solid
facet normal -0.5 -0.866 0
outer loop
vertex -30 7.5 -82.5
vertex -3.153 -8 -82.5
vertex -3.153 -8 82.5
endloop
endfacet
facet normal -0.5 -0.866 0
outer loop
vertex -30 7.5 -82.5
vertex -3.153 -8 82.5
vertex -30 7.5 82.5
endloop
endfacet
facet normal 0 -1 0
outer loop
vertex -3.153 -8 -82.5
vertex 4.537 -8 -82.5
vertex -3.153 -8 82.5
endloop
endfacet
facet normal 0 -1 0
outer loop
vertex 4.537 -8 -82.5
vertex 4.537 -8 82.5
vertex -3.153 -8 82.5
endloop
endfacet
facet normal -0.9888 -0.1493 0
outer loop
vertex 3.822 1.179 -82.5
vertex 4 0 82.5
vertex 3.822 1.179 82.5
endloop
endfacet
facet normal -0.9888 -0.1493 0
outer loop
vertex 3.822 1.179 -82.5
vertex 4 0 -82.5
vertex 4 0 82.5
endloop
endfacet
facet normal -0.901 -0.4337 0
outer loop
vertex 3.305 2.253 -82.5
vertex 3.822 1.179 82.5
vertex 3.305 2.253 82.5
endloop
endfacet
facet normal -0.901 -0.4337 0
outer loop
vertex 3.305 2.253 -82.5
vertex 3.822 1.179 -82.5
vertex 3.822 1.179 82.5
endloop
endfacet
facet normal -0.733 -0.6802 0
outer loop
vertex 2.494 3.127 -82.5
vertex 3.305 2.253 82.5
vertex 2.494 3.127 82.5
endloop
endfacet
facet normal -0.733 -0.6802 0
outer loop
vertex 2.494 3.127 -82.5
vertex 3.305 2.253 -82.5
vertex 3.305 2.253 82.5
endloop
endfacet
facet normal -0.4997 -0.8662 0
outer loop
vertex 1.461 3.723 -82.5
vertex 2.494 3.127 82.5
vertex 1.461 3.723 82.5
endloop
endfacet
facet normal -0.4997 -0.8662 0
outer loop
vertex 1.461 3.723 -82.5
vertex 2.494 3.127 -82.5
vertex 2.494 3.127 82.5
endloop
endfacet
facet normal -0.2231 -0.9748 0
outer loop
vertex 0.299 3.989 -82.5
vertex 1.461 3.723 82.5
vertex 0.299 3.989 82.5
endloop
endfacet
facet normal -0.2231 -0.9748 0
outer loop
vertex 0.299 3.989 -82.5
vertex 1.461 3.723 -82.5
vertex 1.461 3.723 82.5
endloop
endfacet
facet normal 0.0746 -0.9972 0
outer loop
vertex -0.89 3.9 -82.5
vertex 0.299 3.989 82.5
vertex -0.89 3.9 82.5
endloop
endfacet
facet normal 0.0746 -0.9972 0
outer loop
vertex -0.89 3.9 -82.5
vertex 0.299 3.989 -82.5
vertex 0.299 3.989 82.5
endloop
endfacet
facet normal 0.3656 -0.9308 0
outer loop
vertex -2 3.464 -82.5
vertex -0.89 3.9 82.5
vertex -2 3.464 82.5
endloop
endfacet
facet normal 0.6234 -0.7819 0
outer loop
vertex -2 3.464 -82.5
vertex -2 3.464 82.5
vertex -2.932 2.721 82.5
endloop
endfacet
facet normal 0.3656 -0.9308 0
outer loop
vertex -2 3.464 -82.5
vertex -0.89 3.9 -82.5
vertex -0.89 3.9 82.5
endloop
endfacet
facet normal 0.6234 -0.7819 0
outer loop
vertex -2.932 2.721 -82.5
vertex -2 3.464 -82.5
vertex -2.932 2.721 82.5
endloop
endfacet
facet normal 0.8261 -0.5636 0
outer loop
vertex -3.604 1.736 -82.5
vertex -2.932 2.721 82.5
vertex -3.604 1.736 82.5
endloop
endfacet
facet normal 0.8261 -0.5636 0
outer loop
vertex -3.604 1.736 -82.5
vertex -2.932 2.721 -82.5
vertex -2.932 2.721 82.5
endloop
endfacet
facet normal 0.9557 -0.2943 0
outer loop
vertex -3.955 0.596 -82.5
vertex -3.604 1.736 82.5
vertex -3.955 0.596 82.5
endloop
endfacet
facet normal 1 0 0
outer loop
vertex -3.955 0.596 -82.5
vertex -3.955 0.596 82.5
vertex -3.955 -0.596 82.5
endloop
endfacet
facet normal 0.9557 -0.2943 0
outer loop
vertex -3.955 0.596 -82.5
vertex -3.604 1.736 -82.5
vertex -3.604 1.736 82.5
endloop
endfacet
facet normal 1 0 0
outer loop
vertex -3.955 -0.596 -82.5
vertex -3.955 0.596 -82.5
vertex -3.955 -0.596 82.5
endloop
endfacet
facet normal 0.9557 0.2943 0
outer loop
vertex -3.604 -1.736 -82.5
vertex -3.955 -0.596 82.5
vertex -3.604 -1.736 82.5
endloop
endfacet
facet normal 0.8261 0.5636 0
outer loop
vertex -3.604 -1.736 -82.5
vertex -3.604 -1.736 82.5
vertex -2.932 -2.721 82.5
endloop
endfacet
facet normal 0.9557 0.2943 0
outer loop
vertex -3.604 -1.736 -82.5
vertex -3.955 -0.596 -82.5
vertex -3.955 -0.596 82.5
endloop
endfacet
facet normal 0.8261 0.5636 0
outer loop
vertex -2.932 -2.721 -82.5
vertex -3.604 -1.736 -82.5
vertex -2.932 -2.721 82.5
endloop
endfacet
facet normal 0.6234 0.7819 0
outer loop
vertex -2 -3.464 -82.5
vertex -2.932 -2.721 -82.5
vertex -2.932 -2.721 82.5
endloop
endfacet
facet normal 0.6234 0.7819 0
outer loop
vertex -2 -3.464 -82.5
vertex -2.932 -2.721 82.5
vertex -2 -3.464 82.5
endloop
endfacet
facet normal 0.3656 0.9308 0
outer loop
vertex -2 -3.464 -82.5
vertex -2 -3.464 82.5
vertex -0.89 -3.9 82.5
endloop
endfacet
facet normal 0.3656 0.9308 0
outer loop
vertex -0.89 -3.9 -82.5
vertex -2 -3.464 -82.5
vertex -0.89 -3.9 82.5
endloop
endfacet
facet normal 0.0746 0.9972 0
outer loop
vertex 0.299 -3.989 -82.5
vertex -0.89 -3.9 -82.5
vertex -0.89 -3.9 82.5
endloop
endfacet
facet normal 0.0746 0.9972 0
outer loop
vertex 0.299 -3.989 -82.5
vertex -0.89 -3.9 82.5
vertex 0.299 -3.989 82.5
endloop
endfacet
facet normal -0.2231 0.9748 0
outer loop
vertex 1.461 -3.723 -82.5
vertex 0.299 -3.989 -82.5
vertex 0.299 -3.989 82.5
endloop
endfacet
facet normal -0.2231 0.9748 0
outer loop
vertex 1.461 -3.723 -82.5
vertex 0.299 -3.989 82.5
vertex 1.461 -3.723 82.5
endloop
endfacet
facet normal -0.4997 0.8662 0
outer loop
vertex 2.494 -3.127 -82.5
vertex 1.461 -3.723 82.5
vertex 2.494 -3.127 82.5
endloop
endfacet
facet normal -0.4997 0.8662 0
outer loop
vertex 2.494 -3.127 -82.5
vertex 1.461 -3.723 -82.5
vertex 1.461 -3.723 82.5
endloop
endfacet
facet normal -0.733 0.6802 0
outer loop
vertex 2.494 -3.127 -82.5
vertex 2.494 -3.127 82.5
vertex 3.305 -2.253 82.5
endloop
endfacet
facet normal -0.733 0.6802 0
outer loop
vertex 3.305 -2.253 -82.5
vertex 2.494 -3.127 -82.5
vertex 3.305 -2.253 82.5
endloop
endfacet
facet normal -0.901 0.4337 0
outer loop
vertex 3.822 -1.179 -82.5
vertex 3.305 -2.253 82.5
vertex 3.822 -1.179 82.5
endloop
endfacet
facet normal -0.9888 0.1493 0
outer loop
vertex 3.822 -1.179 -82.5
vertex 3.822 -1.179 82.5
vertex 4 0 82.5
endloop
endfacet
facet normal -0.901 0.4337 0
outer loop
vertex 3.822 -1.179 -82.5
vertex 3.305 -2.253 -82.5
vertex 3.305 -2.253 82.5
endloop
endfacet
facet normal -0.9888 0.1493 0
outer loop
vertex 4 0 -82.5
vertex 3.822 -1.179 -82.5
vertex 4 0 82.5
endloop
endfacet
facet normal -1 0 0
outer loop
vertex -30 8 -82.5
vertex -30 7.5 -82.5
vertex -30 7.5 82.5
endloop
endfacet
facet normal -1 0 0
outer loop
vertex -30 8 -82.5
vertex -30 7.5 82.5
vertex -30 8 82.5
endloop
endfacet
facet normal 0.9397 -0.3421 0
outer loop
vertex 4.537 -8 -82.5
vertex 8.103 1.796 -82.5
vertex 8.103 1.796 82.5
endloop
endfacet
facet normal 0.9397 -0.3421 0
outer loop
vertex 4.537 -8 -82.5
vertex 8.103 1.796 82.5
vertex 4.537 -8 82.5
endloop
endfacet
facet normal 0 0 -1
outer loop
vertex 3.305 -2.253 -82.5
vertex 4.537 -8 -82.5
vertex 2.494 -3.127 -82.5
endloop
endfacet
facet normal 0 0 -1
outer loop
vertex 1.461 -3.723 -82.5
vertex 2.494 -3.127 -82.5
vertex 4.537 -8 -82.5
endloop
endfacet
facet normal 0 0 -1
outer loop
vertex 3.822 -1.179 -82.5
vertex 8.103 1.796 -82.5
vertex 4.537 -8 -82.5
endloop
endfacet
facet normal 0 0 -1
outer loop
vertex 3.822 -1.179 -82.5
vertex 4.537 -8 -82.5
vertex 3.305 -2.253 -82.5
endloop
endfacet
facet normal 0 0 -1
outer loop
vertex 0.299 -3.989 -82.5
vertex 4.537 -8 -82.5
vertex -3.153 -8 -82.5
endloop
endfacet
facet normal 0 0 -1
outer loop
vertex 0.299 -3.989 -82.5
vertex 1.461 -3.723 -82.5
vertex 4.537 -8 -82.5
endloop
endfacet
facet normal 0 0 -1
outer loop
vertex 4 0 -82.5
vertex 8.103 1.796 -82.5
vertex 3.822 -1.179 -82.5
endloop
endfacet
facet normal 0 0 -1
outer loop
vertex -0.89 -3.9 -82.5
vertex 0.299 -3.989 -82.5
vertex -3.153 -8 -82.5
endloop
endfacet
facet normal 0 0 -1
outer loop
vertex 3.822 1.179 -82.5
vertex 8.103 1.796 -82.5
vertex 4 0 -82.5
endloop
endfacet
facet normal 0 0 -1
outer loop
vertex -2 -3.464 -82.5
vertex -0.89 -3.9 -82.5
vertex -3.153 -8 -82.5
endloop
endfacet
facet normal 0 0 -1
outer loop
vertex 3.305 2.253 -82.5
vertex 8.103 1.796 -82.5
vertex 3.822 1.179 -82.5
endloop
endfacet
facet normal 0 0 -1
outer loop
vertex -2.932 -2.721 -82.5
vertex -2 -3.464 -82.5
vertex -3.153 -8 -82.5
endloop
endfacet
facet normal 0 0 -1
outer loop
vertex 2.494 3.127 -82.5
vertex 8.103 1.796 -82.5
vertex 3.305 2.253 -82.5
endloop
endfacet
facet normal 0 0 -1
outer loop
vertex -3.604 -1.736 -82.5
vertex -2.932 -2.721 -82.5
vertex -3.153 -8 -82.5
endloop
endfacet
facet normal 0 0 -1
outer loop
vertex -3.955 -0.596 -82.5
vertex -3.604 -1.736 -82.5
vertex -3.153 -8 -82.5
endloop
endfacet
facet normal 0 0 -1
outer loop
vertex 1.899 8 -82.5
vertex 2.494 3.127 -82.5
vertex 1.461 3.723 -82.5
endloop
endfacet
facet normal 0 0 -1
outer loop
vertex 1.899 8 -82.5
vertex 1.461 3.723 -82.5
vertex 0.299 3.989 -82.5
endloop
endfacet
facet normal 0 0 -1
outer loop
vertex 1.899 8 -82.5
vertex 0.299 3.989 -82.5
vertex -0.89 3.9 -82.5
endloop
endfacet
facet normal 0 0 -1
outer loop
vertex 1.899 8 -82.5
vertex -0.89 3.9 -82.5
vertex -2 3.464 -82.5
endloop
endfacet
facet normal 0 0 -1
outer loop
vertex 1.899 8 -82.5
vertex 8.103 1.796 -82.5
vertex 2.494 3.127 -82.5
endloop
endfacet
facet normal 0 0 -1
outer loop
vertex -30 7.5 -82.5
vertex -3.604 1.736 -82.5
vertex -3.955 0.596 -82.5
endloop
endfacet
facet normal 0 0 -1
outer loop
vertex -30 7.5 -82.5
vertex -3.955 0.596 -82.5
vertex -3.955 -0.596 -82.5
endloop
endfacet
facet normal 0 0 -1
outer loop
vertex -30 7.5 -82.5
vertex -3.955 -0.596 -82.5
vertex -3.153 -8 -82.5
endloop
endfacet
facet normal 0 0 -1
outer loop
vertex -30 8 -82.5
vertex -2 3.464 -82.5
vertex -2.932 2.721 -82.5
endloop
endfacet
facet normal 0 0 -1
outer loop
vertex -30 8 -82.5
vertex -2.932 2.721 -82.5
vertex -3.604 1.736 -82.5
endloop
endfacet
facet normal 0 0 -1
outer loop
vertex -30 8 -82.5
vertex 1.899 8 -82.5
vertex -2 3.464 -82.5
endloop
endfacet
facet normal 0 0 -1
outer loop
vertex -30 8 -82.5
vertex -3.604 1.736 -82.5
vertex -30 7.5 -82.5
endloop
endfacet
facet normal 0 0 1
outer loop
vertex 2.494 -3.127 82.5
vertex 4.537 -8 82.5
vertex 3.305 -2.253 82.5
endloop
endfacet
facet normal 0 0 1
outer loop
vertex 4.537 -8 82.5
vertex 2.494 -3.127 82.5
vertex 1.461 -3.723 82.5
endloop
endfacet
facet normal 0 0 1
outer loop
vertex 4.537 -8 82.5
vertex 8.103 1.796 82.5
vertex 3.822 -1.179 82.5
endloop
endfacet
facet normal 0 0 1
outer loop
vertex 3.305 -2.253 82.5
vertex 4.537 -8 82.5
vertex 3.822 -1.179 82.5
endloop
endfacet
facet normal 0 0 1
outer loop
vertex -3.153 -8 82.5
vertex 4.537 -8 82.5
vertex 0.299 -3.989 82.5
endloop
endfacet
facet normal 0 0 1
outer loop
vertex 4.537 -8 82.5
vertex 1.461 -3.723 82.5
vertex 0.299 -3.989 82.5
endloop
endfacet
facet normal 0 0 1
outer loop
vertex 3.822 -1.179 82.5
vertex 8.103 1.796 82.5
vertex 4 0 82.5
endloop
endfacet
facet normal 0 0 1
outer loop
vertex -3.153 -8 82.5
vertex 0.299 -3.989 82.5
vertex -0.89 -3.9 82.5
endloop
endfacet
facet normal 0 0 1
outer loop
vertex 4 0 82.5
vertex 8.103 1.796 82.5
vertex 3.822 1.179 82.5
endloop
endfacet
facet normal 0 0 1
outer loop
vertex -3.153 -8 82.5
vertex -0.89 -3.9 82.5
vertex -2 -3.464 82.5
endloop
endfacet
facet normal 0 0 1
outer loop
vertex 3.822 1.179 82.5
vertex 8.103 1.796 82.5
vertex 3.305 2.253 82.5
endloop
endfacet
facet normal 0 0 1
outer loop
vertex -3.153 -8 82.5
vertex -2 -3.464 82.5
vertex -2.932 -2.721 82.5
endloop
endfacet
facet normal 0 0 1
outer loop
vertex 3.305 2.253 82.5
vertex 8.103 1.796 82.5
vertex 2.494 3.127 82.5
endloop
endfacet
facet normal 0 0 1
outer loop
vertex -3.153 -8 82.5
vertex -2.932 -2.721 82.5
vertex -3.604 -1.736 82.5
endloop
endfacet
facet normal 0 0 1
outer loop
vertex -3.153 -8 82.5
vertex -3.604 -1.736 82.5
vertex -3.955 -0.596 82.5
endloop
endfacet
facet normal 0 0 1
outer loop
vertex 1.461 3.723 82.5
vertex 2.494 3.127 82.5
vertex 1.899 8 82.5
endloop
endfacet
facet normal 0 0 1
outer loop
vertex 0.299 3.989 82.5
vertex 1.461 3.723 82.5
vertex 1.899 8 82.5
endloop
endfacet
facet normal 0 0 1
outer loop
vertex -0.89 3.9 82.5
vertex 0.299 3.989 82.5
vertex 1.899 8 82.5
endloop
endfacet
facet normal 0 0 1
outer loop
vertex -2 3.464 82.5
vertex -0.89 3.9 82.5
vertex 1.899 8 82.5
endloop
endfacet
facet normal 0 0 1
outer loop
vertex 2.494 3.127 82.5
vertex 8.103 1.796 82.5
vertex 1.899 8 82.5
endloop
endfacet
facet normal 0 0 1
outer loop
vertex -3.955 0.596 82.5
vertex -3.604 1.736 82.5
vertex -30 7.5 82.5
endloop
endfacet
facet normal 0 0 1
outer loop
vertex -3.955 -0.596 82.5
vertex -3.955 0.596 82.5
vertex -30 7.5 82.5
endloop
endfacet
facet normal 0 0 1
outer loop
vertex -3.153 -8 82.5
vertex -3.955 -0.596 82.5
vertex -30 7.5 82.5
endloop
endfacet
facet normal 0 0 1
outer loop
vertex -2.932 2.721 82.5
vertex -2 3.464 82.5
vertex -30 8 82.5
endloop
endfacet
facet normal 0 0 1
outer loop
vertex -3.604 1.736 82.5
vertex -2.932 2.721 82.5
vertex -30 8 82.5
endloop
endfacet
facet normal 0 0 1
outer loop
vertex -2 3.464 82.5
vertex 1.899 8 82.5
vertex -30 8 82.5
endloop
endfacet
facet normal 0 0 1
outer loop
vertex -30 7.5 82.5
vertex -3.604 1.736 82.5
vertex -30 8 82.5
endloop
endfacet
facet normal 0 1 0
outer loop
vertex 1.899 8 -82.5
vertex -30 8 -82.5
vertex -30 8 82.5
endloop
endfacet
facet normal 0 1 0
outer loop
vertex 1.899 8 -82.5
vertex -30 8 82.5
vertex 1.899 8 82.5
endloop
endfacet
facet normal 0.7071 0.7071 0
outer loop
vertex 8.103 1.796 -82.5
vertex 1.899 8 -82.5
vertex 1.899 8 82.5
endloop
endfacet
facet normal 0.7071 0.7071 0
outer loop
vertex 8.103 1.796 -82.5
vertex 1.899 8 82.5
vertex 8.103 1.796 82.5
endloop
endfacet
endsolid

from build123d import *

# Parameters (mm, degrees)
SKIZZE1_R                       = 4
AUFSATZ_LINEAR_AUSTRAGEN1_DEPTH = 82.5


with BuildPart() as part:
    # Skizze1 → Aufsatz-Linear austragen1 (new, symmetric)
    with BuildSketch(Plane.XY):
        Polygon((-30, 8), (1.899494937, 8), (8.103084379, 1.796410558), (4.537482533, -8), (-3.153212483, -8), (-30, 7.5), align=None)
        Circle(SKIZZE1_R, mode=Mode.SUBTRACT)
    extrude(amount=AUFSATZ_LINEAR_AUSTRAGEN1_DEPTH, both=True)


solid = part.part
